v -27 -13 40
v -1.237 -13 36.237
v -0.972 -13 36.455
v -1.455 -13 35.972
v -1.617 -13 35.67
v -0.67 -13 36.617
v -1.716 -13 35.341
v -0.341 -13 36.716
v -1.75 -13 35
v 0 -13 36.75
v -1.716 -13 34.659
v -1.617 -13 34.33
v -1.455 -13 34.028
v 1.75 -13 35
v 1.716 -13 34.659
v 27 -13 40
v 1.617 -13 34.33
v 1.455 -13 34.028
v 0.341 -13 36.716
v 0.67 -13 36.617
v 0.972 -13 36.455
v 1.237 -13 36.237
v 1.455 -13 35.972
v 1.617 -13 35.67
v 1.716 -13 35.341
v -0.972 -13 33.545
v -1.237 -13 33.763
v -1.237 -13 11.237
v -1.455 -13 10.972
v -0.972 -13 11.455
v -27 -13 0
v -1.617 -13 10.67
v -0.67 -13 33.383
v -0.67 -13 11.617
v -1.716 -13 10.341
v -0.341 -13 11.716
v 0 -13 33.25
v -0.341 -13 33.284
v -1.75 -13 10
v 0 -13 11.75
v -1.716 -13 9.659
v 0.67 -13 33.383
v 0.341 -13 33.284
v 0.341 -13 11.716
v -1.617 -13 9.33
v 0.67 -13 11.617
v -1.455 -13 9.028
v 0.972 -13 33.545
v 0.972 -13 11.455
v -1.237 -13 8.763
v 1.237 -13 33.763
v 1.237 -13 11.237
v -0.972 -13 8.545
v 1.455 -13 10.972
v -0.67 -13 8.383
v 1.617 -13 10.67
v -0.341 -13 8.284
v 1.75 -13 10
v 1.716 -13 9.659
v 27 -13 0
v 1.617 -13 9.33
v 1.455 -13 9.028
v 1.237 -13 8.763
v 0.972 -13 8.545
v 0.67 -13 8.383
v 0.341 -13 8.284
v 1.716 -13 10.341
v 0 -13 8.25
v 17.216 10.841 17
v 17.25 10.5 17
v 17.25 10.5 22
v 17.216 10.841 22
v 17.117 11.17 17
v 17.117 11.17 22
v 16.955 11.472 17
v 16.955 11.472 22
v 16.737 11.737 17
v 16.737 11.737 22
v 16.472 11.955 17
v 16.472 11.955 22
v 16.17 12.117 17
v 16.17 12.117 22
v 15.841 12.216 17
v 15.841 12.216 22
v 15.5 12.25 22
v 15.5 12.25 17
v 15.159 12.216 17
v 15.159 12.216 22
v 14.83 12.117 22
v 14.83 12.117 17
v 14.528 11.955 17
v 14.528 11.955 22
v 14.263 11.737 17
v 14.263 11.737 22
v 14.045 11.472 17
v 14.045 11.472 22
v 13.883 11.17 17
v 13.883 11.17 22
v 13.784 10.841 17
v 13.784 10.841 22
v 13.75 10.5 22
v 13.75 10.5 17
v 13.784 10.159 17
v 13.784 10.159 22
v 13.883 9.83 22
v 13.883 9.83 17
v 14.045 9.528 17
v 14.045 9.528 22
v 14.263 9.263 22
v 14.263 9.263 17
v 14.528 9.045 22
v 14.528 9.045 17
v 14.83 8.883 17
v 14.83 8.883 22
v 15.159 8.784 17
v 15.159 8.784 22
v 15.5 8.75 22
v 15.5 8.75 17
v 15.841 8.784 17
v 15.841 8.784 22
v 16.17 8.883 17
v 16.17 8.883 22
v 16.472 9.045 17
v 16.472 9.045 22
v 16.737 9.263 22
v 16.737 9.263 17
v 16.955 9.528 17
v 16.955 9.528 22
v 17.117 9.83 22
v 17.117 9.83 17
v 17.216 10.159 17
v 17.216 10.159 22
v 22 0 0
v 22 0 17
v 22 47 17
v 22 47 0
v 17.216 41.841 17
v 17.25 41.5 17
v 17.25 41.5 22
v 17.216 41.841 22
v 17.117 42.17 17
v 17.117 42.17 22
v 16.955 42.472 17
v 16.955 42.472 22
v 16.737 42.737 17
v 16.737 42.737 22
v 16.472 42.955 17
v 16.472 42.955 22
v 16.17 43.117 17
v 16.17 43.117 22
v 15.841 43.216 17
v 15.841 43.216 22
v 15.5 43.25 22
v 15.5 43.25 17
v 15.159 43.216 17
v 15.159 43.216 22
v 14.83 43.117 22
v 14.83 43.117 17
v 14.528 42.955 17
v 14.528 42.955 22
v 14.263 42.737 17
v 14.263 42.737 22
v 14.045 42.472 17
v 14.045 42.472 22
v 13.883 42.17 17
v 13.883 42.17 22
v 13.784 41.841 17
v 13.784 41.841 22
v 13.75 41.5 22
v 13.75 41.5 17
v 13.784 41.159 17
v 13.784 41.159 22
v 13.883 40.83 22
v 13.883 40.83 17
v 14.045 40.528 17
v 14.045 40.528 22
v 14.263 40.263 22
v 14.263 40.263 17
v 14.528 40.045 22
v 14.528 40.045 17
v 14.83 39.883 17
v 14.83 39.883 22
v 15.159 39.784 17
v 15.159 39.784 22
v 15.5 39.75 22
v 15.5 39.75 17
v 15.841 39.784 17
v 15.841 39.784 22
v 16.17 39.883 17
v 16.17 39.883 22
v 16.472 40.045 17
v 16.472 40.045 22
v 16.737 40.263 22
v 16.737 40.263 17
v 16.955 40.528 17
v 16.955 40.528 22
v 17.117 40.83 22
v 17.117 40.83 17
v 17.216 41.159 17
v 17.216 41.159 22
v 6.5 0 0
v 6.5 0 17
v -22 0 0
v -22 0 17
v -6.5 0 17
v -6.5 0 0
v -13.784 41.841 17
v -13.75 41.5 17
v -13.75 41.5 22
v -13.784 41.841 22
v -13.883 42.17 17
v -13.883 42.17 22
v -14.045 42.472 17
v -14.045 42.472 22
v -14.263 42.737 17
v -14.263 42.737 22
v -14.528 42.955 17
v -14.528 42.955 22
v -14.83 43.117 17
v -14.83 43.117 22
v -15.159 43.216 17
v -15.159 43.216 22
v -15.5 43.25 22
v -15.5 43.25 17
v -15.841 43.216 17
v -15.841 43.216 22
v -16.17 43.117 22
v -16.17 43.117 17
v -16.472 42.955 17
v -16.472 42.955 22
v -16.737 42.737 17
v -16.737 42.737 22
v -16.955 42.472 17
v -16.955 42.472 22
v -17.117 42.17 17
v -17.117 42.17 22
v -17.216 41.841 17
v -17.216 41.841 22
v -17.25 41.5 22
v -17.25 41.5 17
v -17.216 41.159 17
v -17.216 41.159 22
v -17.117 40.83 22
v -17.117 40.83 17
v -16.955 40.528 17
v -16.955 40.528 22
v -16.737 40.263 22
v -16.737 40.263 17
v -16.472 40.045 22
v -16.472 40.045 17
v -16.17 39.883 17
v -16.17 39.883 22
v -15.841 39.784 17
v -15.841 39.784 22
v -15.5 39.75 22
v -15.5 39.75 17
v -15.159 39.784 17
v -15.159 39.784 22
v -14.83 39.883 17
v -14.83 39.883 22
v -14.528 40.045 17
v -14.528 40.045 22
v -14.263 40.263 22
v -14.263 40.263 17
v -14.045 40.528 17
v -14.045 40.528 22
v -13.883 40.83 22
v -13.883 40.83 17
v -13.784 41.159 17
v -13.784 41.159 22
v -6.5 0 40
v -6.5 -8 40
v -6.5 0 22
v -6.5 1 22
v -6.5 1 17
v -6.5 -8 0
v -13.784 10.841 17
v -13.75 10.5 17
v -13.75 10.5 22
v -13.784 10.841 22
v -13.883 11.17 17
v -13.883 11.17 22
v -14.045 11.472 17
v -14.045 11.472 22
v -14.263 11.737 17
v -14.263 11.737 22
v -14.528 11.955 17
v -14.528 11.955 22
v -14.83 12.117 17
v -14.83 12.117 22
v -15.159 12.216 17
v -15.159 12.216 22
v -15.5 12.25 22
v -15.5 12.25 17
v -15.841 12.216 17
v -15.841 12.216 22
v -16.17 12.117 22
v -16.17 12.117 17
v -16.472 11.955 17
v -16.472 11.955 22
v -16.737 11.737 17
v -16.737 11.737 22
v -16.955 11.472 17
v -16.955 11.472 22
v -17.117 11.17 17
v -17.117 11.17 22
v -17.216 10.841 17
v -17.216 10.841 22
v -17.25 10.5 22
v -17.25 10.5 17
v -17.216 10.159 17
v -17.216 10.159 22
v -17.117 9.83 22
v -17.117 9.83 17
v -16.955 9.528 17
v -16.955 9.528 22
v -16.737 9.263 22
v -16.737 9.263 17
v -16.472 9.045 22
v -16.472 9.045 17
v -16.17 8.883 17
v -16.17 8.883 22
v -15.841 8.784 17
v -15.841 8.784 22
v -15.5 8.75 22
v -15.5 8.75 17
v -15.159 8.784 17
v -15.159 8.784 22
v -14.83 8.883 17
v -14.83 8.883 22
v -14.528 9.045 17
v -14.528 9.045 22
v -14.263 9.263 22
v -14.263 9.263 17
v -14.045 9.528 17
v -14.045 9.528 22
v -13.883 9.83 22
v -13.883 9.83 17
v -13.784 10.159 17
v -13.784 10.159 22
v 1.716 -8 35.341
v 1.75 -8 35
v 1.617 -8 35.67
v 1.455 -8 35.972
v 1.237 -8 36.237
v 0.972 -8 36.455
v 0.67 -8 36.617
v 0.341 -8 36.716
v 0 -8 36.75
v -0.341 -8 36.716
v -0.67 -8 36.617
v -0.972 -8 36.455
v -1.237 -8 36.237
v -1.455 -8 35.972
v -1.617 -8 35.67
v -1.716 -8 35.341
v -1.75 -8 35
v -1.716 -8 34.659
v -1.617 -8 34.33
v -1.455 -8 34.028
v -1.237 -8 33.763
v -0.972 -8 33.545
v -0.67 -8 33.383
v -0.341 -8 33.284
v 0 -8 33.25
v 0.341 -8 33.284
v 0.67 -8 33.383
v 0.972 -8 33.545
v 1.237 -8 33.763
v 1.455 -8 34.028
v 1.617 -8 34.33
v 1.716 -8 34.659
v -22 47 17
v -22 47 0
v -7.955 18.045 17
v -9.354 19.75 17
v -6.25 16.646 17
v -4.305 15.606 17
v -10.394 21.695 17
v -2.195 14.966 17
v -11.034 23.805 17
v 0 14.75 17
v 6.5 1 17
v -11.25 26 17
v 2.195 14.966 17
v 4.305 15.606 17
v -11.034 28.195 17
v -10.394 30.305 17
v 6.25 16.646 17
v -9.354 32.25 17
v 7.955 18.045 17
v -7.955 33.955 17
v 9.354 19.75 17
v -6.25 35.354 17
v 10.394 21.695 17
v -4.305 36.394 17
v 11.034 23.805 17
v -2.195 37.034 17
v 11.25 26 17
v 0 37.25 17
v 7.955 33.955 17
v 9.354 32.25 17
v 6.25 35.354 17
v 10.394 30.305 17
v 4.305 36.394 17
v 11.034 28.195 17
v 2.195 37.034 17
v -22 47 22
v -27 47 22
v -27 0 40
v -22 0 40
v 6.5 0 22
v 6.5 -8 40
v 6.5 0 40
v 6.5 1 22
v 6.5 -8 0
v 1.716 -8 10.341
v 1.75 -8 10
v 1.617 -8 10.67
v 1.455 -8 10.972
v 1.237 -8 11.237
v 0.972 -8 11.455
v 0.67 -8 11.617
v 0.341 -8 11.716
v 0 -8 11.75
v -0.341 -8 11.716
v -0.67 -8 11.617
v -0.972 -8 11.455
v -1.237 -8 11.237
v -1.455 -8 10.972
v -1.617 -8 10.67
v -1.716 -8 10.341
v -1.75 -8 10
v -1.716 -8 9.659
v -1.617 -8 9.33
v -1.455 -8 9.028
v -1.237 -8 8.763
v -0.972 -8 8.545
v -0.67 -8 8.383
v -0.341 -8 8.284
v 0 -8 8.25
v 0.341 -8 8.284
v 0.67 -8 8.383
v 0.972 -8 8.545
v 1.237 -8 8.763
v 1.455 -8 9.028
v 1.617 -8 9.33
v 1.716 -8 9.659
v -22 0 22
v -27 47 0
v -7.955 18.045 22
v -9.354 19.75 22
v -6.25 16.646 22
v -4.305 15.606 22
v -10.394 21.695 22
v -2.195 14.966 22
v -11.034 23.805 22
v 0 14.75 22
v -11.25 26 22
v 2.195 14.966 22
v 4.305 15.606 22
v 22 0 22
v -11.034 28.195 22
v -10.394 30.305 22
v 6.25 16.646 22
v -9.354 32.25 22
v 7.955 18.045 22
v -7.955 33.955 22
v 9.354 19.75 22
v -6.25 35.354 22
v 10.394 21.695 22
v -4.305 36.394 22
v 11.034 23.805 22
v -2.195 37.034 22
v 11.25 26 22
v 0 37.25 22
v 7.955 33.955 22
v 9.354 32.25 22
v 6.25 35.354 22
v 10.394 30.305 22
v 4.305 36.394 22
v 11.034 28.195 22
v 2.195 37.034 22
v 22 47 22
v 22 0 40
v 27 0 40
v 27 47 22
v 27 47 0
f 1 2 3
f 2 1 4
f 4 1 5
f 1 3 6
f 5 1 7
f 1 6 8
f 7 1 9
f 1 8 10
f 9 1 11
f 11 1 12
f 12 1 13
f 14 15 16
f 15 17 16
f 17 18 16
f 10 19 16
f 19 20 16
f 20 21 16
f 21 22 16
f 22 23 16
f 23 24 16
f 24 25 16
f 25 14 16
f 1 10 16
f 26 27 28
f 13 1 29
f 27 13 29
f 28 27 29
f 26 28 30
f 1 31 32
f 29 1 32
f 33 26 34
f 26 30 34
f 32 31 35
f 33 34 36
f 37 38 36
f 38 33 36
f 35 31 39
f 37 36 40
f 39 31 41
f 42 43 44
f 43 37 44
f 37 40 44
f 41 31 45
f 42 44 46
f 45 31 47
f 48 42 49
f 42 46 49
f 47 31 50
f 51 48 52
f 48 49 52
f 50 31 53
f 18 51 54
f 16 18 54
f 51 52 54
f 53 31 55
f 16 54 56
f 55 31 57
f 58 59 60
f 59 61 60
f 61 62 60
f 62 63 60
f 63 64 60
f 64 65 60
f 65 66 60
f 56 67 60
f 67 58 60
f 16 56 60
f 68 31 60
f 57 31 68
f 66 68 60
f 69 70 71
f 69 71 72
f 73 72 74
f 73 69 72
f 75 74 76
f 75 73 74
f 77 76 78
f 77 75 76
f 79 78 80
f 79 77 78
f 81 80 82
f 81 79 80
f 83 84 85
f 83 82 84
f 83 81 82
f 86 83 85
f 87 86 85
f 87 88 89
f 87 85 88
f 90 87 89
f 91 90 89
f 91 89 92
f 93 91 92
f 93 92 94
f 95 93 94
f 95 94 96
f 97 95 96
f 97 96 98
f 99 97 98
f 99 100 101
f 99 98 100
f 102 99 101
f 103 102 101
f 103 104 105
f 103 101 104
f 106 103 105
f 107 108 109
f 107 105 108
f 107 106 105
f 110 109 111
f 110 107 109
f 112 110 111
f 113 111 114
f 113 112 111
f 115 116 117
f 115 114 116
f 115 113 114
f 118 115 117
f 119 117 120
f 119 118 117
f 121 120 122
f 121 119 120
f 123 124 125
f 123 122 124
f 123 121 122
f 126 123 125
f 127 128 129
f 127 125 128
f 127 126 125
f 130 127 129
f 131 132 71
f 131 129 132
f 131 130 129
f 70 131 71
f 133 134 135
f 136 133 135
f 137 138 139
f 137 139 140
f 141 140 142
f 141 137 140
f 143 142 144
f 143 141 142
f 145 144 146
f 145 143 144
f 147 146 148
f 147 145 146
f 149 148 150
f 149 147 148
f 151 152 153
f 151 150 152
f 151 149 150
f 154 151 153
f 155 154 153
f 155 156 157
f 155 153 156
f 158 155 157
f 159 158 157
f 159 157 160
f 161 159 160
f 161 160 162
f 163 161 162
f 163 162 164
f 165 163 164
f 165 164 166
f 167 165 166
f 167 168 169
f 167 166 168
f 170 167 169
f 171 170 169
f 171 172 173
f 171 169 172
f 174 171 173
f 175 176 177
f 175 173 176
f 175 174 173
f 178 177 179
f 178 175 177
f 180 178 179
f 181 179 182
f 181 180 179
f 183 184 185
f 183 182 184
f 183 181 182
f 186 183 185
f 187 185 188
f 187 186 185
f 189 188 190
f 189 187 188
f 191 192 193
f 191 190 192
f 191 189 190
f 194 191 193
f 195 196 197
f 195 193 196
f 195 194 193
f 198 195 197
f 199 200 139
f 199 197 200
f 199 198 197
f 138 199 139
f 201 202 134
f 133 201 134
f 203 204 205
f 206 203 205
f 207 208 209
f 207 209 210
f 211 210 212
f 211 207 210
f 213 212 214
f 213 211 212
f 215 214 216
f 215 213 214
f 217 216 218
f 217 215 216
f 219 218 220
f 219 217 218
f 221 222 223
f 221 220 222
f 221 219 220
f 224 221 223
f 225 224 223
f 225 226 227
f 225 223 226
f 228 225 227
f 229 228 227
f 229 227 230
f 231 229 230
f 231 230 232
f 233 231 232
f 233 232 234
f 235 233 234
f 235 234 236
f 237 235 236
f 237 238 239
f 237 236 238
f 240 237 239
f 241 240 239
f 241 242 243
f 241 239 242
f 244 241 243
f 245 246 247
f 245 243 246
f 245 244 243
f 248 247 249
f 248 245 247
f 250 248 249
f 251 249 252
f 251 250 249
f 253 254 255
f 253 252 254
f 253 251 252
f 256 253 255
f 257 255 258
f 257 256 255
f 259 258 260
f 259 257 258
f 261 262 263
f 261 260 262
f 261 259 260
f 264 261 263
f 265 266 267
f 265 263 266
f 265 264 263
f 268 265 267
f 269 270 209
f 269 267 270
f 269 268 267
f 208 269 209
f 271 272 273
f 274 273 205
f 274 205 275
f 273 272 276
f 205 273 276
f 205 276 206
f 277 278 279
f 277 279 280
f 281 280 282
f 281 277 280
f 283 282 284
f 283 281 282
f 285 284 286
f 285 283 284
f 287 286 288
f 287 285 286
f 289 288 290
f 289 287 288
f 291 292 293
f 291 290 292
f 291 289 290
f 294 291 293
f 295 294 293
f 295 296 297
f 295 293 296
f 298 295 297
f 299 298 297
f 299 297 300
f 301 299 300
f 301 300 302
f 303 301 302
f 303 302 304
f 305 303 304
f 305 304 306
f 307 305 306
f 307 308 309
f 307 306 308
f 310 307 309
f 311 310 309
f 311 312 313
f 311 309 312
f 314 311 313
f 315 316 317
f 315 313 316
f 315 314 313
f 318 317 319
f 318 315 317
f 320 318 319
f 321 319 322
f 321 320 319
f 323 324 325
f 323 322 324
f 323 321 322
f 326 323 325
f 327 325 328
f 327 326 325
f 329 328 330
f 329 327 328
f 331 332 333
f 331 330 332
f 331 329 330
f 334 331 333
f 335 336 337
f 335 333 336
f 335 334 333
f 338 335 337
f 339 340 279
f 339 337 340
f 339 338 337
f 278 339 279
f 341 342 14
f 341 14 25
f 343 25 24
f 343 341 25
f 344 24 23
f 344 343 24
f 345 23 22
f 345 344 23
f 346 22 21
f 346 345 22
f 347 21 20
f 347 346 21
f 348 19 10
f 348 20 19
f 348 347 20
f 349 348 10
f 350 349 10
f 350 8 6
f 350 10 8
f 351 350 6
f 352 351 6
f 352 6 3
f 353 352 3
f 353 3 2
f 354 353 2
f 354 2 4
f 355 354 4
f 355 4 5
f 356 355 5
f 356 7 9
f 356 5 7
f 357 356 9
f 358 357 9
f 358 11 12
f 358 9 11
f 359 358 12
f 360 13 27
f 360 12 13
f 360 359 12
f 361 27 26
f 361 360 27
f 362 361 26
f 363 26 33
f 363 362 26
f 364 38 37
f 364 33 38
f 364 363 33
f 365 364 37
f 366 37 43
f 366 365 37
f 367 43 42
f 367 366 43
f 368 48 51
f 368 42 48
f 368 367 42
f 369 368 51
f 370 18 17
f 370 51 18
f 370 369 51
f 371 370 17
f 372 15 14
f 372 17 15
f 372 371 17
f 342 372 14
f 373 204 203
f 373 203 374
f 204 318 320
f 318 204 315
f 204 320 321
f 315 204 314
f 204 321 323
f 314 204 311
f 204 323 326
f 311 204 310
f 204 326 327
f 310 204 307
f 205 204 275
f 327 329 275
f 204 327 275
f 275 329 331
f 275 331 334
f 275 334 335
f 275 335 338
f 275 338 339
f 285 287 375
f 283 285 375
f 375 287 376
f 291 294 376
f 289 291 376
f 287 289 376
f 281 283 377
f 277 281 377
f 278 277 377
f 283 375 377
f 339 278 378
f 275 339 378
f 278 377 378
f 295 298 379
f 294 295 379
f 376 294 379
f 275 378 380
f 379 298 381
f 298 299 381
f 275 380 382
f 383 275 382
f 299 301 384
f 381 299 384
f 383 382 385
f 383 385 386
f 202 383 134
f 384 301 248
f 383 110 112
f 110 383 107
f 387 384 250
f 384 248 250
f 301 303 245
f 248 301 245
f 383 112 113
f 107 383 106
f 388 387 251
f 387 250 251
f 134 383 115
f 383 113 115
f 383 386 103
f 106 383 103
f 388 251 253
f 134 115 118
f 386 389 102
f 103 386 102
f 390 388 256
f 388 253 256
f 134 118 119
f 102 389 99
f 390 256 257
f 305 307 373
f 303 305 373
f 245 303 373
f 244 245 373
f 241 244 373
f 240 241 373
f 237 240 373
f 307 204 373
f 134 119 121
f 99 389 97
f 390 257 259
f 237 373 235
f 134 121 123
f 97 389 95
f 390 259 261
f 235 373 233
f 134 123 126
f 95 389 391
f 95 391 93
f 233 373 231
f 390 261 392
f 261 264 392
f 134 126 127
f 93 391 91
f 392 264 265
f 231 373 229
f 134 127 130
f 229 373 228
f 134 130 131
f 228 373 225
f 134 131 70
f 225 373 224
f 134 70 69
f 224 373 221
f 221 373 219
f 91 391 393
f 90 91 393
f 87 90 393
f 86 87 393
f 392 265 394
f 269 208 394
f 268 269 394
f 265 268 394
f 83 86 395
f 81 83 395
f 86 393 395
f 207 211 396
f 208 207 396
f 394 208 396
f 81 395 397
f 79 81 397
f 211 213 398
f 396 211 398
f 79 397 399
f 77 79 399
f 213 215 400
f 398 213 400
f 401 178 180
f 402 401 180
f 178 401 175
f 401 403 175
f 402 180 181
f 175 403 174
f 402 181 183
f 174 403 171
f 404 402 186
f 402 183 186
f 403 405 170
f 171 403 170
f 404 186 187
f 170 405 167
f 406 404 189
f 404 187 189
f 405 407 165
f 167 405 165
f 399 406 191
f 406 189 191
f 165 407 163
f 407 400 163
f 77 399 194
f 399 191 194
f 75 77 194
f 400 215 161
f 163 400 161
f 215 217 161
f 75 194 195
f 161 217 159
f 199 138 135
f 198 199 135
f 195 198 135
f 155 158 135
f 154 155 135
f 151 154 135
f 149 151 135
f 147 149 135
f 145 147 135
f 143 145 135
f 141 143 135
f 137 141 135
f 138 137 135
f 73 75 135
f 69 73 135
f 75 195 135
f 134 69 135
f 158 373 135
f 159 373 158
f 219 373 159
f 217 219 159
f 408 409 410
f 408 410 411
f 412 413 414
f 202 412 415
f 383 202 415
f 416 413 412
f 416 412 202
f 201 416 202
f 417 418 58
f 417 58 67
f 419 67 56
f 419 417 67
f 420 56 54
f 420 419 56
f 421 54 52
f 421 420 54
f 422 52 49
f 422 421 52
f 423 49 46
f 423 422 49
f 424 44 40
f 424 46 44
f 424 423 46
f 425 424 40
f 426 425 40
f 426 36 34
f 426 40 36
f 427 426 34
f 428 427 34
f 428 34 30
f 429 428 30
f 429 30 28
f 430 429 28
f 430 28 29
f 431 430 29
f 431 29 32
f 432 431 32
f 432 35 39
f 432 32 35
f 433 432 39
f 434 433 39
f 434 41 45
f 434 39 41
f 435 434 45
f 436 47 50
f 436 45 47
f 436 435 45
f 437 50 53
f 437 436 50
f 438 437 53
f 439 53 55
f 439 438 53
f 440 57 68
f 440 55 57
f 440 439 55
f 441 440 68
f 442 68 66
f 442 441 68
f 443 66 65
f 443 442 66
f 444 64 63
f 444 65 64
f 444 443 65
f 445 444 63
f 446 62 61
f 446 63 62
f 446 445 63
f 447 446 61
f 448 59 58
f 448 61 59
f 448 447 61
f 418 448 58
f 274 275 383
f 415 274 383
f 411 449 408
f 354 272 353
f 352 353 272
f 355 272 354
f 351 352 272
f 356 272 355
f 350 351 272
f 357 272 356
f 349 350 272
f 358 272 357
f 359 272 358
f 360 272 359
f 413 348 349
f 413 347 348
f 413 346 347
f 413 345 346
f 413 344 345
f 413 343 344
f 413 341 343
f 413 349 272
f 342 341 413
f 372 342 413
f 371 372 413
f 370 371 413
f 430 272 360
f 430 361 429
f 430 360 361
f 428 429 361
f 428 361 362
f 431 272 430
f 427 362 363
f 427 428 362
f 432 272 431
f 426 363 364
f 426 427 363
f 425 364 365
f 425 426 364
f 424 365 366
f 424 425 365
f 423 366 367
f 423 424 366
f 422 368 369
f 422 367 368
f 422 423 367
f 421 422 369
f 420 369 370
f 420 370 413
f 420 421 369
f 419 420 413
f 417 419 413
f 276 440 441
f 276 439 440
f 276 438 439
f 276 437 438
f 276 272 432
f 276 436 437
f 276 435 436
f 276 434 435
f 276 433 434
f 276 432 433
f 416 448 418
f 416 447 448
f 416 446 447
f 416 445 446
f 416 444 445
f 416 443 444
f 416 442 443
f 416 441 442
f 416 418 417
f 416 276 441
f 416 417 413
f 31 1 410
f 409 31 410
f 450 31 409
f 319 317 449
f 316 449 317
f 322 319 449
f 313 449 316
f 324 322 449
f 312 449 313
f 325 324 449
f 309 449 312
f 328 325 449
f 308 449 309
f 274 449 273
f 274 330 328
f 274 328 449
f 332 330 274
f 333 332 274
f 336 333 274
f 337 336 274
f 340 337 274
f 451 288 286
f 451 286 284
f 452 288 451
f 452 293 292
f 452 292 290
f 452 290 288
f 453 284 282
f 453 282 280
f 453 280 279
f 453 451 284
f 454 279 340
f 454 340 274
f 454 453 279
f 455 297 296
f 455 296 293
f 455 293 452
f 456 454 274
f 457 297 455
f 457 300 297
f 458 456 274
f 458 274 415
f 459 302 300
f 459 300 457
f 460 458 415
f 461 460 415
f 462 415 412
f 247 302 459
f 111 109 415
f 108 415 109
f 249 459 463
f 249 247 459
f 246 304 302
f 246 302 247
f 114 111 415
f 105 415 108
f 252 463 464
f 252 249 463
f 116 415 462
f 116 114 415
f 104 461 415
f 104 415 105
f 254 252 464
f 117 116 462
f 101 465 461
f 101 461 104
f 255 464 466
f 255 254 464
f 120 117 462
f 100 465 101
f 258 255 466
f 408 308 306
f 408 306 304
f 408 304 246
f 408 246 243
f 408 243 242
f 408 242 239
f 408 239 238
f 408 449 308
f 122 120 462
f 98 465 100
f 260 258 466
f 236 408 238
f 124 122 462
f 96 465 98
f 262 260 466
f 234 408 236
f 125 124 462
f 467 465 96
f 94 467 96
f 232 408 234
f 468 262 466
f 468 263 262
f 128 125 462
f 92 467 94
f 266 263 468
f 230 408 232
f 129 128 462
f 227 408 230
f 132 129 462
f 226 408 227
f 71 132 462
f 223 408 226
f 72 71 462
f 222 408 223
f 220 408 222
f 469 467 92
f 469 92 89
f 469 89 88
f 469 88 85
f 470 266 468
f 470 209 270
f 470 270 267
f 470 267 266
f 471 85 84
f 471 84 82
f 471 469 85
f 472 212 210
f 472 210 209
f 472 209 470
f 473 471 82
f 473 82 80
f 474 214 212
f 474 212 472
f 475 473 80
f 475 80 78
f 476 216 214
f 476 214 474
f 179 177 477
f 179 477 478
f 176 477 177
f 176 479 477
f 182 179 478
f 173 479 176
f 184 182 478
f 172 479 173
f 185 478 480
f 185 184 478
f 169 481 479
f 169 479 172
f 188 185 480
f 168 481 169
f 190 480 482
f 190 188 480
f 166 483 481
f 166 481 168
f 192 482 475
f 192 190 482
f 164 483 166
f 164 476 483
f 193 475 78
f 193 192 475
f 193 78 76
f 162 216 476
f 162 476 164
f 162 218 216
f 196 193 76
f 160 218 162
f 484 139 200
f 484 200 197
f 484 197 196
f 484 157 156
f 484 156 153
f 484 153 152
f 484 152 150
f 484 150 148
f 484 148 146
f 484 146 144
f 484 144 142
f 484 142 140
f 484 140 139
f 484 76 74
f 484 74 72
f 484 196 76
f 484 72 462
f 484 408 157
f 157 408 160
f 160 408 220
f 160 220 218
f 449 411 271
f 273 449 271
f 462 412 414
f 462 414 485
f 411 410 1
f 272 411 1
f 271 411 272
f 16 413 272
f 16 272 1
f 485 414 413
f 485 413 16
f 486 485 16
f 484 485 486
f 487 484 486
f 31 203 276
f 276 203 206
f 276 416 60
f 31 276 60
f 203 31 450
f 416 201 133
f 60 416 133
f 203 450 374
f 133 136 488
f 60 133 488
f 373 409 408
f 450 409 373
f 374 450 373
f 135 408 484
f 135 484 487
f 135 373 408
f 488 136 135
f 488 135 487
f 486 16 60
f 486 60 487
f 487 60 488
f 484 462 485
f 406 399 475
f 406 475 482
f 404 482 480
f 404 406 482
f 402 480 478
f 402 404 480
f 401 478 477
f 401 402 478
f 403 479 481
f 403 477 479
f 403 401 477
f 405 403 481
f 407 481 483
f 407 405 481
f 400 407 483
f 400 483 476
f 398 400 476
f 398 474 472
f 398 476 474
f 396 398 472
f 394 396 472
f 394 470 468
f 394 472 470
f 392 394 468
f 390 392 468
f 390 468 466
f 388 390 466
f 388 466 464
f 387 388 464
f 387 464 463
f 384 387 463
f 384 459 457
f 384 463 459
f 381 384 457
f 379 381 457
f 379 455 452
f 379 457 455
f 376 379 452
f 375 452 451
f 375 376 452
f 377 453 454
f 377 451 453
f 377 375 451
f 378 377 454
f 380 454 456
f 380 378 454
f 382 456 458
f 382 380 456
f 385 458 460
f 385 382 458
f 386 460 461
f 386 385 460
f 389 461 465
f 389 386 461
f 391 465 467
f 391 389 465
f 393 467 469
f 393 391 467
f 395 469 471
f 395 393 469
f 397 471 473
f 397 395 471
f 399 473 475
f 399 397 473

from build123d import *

# Parameters (mm, degrees)
SKETCH113_W     = 54
SKETCH113_H     = 60
SKETCH113_R     = 11.25
SKETCH113_R_2   = 1.75
PAD070_DEPTH    = 40
SKETCH125_W     = 44
SKETCH125_H     = 50
POCKET041_DEPTH = 18.001
SKETCH126_W     = 13
SKETCH126_H     = 9
POCKET042_DEPTH = 40.001
SKETCH127_R     = 1.75
POCKET043_DEPTH = 13.001
SKETCH161_W     = 44
SKETCH161_H     = 50
POCKET060_DEPTH = 17.001
CHAMFER_SIZE2   = 47
CHAMFER_SIZE    = 18


with BuildPart() as part:
    # Sketch113 → Pad070 (new body)
    with BuildSketch(Plane.XY):
        with Locations((0, 17)):
            Rectangle(SKETCH113_W, SKETCH113_H)
        with Locations((0, 26)):
            Circle(SKETCH113_R, mode=Mode.SUBTRACT)
        with Locations((-15.5, 41.5)):
            Circle(SKETCH113_R_2, mode=Mode.SUBTRACT)
        with Locations((15.5, 41.5)):
            Circle(SKETCH113_R_2, mode=Mode.SUBTRACT)
        with Locations((15.5, 10.5)):
            Circle(SKETCH113_R_2, mode=Mode.SUBTRACT)
        with Locations((-15.5, 10.5)):
            Circle(SKETCH113_R_2, mode=Mode.SUBTRACT)
    extrude(amount=PAD070_DEPTH)

    # Sketch125 → Pocket041 (cut, through all)
    with BuildSketch(Plane.XY.offset(22)):
        with Locations((0, 25)):
            Rectangle(SKETCH125_W, SKETCH125_H)
    extrude(amount=POCKET041_DEPTH, mode=Mode.SUBTRACT)

    # Sketch126 → Pocket042 (cut, through all)
    with BuildSketch(Plane.XY):
        with Locations((0, -3.5)):
            Rectangle(SKETCH126_W, SKETCH126_H)
    extrude(amount=POCKET042_DEPTH, mode=Mode.SUBTRACT)

    # Sketch127 → Pocket043 (cut, through all)
    with BuildSketch(Plane.XZ):
        with Locations((0, 35)):
            Circle(SKETCH127_R)
        with Locations((0, 10)):
            Circle(SKETCH127_R)
    extrude(amount=POCKET043_DEPTH, mode=Mode.SUBTRACT)

    # Sketch161 → Pocket060 (cut, through all)
    with BuildSketch(Plane.XY.offset(17)):
        with Locations((0, 25)):
            Rectangle(SKETCH161_W, SKETCH161_H)
    extrude(amount=-POCKET060_DEPTH, mode=Mode.SUBTRACT)

    # Chamfer
    chamfer_edges = [part.edges().sort_by_distance(p)[0] for p in [
        (24.5, 47, 40),
        (-24.5, 47, 40),
    ]]
    chamfer_side = part.faces().sort_by_distance((0, 47, 19.822581))[0]
    chamfer(chamfer_edges, length=CHAMFER_SIZE, length2=CHAMFER_SIZE2, reference=chamfer_side)


solid = part.part
